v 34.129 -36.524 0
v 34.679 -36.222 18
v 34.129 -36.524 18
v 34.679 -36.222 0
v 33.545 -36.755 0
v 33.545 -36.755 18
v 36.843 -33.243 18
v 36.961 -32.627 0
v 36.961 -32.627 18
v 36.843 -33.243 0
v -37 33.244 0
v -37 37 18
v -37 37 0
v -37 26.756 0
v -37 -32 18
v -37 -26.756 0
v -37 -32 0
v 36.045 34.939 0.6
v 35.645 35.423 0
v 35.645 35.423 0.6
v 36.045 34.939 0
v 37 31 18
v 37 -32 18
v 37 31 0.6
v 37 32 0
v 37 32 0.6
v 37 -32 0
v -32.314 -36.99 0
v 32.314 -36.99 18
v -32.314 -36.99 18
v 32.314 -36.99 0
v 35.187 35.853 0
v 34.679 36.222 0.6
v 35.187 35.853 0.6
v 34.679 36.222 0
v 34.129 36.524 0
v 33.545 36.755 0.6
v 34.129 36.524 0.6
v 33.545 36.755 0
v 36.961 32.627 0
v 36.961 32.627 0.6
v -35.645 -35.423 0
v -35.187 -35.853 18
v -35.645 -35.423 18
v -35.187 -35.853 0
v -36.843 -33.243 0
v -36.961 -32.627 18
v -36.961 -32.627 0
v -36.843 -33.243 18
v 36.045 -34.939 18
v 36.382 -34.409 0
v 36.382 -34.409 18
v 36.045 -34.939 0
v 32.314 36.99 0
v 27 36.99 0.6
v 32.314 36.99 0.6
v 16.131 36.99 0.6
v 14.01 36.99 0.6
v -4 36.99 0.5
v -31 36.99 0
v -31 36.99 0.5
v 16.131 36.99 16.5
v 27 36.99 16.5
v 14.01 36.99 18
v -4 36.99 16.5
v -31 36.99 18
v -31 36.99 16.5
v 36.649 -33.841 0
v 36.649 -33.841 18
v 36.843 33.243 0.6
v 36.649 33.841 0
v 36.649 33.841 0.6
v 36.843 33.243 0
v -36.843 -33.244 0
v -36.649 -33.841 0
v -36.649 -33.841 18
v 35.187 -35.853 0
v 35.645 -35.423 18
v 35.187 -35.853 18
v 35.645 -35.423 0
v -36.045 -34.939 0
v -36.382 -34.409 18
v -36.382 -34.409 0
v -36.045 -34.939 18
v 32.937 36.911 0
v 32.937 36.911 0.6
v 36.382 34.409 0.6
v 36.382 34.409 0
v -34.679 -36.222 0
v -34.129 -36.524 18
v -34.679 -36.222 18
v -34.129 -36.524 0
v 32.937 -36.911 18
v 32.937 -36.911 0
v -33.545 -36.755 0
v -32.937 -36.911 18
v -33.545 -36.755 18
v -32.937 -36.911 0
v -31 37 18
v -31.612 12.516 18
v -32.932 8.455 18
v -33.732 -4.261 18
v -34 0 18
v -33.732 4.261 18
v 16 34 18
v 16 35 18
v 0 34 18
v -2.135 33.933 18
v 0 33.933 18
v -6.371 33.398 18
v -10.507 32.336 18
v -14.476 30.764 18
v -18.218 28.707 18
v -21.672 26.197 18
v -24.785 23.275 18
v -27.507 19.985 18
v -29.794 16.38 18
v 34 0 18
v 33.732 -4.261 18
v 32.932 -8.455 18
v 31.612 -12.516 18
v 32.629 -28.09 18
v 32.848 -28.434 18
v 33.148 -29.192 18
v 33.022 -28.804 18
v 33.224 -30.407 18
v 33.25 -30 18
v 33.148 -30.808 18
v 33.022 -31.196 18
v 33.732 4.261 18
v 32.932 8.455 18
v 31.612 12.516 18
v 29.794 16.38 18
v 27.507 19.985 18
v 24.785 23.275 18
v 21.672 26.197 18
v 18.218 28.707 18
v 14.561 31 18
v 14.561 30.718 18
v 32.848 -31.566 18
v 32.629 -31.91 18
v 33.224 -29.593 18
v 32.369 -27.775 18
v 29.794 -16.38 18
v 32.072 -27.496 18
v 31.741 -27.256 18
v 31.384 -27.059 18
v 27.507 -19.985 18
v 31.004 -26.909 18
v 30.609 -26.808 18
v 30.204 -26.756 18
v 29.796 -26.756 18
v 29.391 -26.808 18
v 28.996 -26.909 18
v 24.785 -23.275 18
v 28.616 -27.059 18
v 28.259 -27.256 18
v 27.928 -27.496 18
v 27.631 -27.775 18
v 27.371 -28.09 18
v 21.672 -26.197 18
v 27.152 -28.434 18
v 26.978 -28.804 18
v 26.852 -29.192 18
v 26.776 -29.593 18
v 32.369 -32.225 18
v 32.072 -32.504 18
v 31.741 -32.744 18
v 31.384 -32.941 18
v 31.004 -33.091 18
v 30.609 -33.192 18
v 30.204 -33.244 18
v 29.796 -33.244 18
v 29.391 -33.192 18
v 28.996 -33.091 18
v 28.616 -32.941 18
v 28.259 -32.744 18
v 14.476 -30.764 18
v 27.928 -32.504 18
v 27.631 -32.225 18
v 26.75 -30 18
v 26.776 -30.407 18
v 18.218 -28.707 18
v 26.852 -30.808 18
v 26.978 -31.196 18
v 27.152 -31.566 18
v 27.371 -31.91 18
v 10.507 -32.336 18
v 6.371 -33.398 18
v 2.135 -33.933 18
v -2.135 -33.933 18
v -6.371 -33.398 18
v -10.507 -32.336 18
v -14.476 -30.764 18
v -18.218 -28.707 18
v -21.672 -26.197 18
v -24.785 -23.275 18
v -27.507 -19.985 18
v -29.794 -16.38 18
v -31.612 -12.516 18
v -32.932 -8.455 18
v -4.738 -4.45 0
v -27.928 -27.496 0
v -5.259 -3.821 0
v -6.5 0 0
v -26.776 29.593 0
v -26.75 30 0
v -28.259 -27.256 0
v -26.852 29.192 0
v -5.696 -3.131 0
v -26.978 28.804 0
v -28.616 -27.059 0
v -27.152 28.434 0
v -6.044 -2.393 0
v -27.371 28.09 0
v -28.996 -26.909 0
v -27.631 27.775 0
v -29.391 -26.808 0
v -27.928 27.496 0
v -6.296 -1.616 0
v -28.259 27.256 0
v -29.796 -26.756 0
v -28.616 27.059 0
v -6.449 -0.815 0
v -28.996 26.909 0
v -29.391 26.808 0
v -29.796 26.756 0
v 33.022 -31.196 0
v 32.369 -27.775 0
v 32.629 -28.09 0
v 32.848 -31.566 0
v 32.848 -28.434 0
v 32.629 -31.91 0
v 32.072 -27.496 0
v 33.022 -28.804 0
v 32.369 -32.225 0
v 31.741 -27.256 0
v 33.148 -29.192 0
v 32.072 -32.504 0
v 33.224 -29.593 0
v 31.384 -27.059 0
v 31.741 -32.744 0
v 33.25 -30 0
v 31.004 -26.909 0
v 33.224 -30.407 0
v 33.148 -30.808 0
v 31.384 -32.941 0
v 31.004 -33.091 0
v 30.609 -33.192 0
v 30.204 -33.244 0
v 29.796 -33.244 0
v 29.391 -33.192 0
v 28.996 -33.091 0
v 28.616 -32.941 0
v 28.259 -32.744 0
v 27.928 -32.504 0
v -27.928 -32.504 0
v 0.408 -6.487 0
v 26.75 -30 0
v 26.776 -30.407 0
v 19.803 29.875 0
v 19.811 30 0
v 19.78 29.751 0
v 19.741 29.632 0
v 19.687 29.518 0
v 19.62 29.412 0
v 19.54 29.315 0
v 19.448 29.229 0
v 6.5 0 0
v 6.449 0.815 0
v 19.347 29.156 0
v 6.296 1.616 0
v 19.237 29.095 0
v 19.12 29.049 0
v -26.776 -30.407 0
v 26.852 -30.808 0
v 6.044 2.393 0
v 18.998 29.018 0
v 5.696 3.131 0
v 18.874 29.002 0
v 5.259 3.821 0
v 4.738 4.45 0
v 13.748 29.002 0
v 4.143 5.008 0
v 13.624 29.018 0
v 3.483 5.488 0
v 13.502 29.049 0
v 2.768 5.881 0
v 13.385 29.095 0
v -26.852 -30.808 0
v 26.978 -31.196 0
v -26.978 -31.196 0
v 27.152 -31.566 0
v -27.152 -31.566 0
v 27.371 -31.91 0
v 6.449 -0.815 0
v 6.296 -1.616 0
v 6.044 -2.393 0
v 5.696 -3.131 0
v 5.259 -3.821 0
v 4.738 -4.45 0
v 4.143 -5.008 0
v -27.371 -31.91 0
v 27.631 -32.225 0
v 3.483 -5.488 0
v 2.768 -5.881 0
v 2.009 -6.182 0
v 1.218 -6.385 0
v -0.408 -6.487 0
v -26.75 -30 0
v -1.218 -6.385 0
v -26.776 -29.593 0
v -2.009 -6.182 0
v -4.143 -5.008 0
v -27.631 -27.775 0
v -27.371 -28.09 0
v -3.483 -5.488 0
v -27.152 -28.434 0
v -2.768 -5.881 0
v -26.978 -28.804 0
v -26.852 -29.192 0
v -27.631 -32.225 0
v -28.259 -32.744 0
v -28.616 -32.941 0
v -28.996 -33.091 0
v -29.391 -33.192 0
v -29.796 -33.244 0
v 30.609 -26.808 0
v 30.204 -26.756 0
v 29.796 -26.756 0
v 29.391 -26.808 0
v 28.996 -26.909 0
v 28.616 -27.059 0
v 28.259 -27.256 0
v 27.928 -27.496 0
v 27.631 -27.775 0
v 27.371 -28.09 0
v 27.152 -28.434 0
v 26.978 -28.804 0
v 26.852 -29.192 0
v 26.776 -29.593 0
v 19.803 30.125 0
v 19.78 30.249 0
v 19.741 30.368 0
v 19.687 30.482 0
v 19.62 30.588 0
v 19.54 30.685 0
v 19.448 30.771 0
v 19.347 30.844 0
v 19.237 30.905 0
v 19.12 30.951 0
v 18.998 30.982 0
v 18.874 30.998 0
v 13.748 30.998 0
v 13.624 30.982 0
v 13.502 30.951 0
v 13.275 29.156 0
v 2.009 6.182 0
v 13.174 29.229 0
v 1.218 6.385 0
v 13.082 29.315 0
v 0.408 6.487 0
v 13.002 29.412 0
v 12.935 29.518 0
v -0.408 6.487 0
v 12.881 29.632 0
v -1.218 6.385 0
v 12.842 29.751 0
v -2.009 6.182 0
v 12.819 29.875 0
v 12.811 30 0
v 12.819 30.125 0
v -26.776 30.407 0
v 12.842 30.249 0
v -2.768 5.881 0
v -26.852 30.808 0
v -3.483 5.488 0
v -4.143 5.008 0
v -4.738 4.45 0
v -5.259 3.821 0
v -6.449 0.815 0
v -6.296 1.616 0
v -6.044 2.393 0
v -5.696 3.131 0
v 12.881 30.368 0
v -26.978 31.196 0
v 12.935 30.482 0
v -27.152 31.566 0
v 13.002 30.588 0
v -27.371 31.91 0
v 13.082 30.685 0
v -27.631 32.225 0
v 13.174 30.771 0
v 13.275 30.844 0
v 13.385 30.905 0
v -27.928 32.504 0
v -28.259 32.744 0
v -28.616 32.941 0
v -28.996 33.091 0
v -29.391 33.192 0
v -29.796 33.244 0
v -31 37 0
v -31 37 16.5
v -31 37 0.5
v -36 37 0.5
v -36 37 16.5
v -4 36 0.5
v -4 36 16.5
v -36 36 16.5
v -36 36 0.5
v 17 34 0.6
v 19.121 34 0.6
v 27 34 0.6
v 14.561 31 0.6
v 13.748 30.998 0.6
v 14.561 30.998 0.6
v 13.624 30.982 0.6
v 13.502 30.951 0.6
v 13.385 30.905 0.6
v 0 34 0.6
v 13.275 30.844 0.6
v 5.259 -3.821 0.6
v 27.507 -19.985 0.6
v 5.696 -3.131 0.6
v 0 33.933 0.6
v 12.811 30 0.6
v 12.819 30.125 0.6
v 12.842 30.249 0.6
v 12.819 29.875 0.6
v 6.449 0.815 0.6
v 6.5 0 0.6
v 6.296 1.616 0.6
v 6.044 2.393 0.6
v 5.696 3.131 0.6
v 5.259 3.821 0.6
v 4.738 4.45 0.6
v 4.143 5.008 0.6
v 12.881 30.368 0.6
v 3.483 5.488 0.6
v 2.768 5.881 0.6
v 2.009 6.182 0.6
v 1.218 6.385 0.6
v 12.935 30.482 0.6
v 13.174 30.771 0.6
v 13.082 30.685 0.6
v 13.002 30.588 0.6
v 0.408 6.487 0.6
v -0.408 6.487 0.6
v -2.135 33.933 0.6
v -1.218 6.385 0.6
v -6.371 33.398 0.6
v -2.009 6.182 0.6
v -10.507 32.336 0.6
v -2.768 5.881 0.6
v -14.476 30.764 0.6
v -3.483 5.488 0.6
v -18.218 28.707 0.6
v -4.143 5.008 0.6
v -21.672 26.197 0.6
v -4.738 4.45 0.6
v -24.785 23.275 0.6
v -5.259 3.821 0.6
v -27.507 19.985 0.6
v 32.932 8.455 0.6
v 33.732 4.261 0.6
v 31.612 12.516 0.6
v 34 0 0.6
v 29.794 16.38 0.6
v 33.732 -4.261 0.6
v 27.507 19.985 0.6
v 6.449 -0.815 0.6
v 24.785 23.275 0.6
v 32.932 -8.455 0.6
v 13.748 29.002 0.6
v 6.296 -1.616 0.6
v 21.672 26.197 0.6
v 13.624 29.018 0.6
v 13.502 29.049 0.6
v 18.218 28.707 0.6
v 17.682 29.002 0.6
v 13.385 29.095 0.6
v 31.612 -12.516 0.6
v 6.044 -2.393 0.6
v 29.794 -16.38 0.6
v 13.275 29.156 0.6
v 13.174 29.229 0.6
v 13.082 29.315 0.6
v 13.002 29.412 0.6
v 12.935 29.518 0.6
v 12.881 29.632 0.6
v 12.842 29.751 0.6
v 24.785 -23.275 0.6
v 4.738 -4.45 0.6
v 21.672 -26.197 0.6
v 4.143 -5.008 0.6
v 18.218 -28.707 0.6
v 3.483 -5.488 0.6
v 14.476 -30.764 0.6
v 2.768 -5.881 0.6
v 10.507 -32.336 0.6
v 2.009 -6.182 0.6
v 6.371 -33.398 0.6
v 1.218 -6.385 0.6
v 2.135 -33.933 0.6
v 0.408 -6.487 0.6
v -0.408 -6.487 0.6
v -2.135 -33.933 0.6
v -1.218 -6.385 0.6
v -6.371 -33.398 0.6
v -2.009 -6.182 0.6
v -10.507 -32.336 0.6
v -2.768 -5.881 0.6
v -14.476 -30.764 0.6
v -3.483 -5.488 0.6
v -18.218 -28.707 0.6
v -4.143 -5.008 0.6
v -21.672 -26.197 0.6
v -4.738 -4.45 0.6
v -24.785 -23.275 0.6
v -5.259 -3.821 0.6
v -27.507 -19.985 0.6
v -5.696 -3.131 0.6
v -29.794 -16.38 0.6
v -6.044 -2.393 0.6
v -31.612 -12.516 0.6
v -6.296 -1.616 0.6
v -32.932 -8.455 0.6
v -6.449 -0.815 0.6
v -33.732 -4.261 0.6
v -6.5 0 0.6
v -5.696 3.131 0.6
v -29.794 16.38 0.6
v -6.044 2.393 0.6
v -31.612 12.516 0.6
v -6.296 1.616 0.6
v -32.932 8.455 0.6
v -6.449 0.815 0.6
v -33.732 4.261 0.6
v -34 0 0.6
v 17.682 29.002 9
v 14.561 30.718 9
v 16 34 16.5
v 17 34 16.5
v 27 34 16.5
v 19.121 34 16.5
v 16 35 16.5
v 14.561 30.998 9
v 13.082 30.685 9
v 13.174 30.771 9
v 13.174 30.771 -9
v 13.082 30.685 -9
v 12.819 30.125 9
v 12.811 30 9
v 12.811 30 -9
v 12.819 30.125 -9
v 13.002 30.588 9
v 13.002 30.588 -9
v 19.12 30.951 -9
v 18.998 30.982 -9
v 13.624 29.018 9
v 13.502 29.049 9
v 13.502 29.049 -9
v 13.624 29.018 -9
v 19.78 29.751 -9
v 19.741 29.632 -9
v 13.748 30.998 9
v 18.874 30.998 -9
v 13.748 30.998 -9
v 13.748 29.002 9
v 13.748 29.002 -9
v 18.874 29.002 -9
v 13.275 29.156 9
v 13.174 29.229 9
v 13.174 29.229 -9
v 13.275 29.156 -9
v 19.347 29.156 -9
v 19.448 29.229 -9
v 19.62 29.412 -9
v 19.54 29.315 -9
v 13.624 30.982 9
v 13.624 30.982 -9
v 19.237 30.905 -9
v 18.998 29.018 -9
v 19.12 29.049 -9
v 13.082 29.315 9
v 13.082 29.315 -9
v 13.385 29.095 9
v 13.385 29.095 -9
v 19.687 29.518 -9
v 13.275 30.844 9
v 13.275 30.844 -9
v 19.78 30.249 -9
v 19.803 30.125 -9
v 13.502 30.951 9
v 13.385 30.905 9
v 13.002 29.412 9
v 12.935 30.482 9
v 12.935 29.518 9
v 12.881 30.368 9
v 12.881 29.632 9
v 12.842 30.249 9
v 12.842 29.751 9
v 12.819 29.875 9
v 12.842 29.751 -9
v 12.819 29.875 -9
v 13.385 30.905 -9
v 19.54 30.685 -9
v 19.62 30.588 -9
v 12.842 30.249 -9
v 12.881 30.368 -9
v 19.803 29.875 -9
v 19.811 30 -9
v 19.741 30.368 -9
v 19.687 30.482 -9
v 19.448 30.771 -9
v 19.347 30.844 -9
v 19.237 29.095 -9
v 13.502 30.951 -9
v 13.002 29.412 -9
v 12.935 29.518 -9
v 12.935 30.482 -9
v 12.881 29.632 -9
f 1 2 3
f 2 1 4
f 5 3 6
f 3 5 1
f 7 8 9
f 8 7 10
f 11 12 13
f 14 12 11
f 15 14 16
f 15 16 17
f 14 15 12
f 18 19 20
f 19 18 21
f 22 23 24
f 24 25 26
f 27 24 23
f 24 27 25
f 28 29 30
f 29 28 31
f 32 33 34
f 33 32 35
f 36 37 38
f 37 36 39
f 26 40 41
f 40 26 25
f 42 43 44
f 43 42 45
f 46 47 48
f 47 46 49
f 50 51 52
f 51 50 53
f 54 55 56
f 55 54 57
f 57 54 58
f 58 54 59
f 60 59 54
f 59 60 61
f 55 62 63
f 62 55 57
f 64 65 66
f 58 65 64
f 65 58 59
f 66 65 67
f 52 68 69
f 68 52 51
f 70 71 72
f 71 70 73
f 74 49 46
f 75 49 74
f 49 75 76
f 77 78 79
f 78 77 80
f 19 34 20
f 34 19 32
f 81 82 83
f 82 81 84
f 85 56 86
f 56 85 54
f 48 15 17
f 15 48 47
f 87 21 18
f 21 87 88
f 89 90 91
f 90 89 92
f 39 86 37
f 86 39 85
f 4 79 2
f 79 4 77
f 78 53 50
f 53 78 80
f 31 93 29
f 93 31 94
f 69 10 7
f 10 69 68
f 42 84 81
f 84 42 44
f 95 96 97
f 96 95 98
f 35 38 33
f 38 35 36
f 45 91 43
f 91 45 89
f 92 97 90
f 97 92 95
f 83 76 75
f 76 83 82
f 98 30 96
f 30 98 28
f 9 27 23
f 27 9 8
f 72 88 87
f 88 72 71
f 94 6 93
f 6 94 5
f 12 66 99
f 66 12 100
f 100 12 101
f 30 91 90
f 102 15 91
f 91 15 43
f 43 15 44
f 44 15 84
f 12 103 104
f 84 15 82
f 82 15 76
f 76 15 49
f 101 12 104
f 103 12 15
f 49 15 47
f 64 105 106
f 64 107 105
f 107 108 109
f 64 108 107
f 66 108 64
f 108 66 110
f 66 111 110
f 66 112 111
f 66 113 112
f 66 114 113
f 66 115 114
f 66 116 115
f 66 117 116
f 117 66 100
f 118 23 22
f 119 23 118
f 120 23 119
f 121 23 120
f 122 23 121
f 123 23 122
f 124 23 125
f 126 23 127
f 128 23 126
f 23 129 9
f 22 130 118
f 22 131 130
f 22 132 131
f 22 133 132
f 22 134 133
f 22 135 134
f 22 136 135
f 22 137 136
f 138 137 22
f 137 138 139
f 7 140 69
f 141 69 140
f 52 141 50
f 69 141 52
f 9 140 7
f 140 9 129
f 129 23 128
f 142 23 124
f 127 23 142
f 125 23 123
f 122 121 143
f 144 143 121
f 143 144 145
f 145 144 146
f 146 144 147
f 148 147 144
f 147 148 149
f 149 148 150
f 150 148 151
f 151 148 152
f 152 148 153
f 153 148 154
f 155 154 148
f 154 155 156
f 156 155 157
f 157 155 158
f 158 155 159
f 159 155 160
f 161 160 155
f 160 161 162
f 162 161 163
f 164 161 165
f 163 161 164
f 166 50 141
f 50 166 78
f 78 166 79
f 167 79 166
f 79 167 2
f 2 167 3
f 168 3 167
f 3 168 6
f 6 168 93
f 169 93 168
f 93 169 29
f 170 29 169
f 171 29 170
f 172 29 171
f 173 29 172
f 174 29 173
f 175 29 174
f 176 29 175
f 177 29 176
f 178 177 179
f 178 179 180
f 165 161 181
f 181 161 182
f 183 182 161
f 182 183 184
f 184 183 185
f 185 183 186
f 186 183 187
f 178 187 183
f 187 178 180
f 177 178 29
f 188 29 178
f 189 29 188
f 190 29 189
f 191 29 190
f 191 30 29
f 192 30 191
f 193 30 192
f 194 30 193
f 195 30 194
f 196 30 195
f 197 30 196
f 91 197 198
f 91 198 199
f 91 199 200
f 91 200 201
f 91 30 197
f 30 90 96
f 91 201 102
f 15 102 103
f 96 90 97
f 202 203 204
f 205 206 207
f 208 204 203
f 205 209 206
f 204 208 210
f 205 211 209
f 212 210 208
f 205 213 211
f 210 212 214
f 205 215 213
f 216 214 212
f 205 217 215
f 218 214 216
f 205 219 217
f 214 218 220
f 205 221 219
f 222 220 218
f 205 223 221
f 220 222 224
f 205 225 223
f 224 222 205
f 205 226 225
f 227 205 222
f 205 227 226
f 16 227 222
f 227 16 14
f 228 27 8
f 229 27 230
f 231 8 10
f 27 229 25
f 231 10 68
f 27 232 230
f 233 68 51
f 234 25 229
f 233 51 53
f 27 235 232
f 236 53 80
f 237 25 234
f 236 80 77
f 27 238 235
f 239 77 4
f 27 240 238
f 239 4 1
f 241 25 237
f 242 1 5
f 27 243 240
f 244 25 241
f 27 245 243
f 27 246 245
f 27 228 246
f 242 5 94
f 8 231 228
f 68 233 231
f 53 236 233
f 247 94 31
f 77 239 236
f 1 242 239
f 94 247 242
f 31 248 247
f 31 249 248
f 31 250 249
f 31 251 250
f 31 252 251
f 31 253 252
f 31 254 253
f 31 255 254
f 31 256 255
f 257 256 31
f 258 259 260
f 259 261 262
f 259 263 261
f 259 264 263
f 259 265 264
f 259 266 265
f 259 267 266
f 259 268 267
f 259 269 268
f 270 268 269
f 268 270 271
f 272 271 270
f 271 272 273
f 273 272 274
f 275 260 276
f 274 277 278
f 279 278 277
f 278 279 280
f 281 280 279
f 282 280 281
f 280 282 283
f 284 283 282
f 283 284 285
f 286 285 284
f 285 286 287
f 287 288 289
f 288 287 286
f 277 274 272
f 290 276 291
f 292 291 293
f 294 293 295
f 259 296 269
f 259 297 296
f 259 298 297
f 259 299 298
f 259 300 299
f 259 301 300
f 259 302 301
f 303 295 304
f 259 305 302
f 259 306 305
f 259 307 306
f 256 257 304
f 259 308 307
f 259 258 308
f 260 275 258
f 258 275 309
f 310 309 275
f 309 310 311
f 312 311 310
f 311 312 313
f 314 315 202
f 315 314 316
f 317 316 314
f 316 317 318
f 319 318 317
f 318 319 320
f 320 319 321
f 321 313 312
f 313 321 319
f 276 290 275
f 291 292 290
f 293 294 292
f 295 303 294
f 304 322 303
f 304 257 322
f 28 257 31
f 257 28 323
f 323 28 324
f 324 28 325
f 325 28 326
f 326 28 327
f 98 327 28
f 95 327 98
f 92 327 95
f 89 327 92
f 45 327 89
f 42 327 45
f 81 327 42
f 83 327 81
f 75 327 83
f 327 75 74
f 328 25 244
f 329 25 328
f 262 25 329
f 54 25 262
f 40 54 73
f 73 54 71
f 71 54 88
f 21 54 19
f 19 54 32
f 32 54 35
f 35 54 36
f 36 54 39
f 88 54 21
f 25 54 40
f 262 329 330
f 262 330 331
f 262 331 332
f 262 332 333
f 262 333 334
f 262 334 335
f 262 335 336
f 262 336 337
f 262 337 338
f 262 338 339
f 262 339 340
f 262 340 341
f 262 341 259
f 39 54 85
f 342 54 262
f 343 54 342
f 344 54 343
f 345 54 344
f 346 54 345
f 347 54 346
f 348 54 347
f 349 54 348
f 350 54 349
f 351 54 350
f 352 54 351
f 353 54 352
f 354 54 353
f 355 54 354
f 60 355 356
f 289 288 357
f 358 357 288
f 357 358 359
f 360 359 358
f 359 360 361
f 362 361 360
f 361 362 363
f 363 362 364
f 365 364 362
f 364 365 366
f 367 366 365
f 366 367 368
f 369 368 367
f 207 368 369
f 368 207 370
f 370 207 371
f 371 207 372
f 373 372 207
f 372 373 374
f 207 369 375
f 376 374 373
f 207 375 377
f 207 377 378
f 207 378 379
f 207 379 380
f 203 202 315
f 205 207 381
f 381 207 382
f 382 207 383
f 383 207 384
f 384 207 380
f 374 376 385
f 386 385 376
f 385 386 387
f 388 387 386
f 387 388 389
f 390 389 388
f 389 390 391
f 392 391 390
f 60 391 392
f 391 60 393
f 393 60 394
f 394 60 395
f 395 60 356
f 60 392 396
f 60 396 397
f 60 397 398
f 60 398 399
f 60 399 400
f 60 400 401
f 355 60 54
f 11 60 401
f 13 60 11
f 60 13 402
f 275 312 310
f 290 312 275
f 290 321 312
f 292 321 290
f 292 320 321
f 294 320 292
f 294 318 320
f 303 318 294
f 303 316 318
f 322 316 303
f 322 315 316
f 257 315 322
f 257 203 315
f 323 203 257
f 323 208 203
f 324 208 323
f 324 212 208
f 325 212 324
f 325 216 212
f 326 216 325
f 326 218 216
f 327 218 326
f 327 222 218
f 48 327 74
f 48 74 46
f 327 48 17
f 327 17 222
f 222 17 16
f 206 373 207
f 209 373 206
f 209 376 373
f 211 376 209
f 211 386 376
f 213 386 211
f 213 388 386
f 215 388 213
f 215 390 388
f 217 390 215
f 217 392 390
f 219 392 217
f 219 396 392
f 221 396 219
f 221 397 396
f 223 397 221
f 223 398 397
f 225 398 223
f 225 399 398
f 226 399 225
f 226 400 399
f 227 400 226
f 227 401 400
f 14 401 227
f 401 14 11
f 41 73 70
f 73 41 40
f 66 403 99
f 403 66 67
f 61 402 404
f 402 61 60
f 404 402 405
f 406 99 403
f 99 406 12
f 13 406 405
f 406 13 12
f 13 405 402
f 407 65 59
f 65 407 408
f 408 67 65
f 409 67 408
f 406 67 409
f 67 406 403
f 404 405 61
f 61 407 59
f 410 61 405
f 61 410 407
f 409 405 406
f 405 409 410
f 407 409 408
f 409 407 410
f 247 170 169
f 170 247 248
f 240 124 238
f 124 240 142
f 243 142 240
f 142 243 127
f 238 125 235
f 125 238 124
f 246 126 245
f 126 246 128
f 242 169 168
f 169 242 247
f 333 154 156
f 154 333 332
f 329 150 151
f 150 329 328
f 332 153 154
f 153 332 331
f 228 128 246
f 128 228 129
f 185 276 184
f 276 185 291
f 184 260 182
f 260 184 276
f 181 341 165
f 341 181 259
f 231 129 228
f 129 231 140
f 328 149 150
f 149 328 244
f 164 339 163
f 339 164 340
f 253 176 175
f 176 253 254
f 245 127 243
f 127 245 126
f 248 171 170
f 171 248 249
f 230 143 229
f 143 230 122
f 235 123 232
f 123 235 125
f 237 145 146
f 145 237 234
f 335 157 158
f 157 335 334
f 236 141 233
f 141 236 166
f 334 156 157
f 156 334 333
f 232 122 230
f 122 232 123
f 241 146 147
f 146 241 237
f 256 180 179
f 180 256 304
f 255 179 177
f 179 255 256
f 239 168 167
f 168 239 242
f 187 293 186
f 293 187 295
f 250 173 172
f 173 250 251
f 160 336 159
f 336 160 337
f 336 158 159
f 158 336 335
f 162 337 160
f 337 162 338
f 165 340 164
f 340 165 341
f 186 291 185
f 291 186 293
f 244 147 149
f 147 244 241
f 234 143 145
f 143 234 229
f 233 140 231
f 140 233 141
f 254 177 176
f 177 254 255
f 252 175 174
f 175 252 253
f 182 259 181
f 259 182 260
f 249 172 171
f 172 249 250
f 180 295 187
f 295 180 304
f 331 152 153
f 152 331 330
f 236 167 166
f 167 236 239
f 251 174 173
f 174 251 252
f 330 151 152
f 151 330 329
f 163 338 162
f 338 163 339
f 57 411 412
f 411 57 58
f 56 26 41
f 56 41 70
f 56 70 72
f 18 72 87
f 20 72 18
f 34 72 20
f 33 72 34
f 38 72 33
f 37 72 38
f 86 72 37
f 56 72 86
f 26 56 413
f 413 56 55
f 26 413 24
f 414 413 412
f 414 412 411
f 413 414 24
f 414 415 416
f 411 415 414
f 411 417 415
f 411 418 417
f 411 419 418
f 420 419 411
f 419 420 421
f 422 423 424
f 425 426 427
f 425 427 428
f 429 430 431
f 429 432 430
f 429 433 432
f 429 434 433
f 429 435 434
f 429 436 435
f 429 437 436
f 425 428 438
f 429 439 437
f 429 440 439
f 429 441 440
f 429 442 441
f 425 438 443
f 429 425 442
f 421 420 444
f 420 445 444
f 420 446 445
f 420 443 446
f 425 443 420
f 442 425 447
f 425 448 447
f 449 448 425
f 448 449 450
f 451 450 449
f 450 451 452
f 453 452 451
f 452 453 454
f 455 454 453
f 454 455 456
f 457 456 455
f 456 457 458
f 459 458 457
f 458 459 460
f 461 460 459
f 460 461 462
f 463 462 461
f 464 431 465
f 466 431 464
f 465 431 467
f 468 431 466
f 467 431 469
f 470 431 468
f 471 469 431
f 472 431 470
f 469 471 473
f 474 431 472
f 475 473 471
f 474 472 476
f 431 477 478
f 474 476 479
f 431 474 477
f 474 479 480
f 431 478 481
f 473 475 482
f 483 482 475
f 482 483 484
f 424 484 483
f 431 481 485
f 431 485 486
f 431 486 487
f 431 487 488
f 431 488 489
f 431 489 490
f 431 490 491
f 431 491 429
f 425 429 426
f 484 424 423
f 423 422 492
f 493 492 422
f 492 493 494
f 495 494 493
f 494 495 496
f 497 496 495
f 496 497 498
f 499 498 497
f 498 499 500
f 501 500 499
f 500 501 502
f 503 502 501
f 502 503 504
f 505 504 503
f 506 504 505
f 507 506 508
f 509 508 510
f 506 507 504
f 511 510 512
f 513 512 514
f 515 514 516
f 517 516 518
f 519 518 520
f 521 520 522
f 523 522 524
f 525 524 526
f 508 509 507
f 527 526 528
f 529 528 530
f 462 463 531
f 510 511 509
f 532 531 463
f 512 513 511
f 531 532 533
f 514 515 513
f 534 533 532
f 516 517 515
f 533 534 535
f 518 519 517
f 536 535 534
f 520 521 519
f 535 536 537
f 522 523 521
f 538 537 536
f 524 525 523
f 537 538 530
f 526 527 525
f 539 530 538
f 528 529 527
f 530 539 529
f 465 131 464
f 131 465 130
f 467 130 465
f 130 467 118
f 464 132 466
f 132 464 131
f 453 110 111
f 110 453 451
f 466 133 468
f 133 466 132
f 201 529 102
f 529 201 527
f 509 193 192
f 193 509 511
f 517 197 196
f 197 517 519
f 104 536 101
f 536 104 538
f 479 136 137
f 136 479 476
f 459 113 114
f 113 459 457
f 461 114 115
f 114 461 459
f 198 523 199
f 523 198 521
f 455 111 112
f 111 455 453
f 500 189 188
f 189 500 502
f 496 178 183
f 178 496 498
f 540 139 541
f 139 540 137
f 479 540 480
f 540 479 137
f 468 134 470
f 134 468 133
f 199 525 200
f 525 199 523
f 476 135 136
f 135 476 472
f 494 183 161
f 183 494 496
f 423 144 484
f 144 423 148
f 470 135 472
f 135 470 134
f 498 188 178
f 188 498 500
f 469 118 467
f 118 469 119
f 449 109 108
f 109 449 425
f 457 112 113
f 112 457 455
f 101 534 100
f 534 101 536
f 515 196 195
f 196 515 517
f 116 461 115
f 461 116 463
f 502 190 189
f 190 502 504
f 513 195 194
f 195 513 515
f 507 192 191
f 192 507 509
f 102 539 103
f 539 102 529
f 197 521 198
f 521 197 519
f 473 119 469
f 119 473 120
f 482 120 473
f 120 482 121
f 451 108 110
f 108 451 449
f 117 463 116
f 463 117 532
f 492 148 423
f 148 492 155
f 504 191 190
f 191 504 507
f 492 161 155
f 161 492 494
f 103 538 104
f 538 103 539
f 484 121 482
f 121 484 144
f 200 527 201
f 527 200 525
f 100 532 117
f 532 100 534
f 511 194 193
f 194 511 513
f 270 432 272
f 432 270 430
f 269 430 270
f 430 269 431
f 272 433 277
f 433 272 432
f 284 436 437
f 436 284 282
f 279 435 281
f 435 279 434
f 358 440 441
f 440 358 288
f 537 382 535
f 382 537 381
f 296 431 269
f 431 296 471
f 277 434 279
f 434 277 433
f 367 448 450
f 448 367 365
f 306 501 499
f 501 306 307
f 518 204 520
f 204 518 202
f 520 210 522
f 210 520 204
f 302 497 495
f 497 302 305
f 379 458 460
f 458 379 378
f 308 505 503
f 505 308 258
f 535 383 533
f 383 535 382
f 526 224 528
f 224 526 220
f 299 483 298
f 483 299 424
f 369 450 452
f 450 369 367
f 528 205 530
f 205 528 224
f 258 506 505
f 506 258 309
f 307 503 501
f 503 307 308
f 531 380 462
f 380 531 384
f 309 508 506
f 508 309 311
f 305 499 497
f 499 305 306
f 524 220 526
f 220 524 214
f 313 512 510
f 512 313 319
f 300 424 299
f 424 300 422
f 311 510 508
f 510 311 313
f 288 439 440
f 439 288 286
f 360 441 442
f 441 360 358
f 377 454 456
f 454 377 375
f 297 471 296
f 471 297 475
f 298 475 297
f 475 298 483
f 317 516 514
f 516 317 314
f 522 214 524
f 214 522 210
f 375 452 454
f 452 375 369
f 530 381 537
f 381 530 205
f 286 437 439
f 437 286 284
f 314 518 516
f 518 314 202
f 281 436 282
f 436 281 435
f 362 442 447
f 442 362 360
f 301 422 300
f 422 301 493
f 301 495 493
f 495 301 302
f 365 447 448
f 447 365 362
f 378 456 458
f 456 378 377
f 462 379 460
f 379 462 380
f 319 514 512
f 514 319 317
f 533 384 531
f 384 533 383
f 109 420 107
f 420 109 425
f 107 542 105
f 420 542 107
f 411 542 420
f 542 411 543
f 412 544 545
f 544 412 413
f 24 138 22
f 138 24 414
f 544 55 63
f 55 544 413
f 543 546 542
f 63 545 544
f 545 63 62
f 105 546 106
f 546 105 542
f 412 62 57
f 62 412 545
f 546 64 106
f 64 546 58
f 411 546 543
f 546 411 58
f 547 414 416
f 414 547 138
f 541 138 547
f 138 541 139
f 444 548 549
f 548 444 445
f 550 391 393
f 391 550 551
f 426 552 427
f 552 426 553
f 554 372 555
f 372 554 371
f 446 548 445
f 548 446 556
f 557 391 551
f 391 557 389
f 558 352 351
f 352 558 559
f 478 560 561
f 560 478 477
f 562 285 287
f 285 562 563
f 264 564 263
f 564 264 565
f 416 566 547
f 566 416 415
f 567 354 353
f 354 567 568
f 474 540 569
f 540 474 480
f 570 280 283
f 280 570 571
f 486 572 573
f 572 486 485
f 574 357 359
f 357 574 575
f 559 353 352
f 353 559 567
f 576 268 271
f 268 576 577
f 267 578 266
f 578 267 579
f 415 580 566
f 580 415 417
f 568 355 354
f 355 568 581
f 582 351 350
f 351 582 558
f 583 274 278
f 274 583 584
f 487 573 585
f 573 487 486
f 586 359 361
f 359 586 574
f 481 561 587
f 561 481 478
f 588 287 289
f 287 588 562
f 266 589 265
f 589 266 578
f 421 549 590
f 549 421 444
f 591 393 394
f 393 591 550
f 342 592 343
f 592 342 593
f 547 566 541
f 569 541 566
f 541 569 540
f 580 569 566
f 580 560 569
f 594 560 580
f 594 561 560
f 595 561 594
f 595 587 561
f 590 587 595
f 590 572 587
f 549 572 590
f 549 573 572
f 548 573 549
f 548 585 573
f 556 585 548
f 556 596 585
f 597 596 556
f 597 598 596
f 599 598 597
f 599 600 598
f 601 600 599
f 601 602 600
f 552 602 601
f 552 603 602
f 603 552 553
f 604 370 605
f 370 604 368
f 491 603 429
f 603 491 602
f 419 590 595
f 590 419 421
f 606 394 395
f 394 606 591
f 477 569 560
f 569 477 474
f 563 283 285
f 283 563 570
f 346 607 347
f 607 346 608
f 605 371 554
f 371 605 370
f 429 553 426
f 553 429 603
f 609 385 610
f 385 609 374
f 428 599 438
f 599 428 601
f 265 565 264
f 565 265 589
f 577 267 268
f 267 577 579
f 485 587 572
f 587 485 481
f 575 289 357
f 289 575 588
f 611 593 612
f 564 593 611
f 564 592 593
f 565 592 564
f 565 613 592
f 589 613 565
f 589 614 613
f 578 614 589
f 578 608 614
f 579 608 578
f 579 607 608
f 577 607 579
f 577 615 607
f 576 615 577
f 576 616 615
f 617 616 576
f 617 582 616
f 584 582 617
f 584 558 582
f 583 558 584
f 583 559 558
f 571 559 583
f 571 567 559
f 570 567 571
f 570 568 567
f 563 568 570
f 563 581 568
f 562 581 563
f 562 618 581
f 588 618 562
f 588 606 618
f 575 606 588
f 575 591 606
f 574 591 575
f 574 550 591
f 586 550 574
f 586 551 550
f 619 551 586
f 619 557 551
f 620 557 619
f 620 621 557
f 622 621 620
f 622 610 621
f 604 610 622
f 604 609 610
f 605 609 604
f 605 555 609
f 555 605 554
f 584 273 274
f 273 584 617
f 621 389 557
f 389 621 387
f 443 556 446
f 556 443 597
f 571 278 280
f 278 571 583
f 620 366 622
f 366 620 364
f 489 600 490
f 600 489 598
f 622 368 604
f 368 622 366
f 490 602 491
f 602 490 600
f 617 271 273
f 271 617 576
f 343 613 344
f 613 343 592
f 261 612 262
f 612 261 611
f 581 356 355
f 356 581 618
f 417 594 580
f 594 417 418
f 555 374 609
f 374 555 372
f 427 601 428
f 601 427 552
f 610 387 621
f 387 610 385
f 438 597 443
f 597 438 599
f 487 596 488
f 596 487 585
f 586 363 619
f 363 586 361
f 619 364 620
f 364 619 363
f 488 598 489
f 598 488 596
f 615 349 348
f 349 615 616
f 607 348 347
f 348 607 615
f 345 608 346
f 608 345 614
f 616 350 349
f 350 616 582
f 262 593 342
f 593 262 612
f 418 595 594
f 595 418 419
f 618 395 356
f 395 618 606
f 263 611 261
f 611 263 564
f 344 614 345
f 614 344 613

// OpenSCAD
$fn = 50;


union() {
	difference() {
		union() {
			hull() {
				translate(v = [-32.0000000000, 32.0000000000, 0]) {
					cylinder(h = 18, r = 5);
				}
				translate(v = [32.0000000000, 32.0000000000, 0]) {
					cylinder(h = 18, r = 5);
				}
				translate(v = [-32.0000000000, -32.0000000000, 0]) {
					cylinder(h = 18, r = 5);
				}
				translate(v = [32.0000000000, -32.0000000000, 0]) {
					cylinder(h = 18, r = 5);
				}
			}
			translate(v = [-37.0000000000, 31.0000000000, 0]) {
				cube(size = [6, 6, 18]);
			}
		}
		union() {
			translate(v = [-37.5000000000, -30.0000000000, -250.0000000000]) {
				rotate(a = [0, 0, 0]) {
					difference() {
						union() {
							hull() {
								translate(v = [7.5000000000, 0, 0]) {
									cylinder(h = 250, r = 3.2500000000, r1 = 3.2500000000, r2 = 3.2500000000);
								}
								translate(v = [-7.5000000000, 0, 0]) {
									cylinder(h = 250, r = 3.2500000000, r1 = 3.2500000000, r2 = 3.2500000000);
								}
							}
						}
						union();
					}
				}
			}
			translate(v = [-37.5000000000, 30.0000000000, -250.0000000000]) {
				rotate(a = [0, 0, 0]) {
					difference() {
						union() {
							hull() {
								translate(v = [7.5000000000, 0, 0]) {
									cylinder(h = 250, r = 3.2500000000, r1 = 3.2500000000, r2 = 3.2500000000);
								}
								translate(v = [-7.5000000000, 0, 0]) {
									cylinder(h = 250, r = 3.2500000000, r1 = 3.2500000000, r2 = 3.2500000000);
								}
							}
						}
						union();
					}
				}
			}
			translate(v = [-36.0000000000, 36.0000000000, 0.5000000000]) {
				cube(size = [32, 1, 16]);
			}
			translate(v = [30.0000000000, -30.0000000000, 0]) {
				cylinder(h = 100, r = 3.2500000000);
			}
			translate(v = [0, 0, 0.6000000000]) {
				cylinder(h = 20.4000000000, r = 34.0000000000);
			}
			translate(v = [0, 0, -9.0000000000]) {
				cylinder(h = 18, r = 6.5000000000);
			}
			translate(v = [0.0000000000, 31.0000000000, 0.6000000000]) {
				cube(size = [37.0000000000, 3, 20.4000000000]);
			}
			translate(v = [27.0000000000, 31.0000000000, 0.6000000000]) {
				cube(size = [10, 6, 20.4000000000]);
			}
			translate(v = [16.0000000000, 31.0000000000, 16.5000000000]) {
				cube(size = [21, 6, 1.5000000000]);
			}
			translate(v = [13.2500000000, 37.7500000000, 0.6000000000]) {
				rotate(a = [0, 0, -45]) {
					cube(size = [7.5000000000, 1.5000000000, 20.4000000000]);
				}
			}
			translate(v = [7.0610000000, 29.0000000000, 0.6000000000]) {
				cube(size = [7.5000000000, 2, 17.4000000000]);
			}
		}
	}
	union() {
		translate(v = [16.3110000000, 30.0000000000, -9.0000000000]) {
			rotate(a = [0, 0, 0]) {
				difference() {
					union() {
						#hull() {
							#translate(v = [2.5000000000, 0, 0]) {
								cylinder(h = 18, r = 1.0000000000, r1 = 1.0000000000, r2 = 1.0000000000);
							}
							#translate(v = [-2.5000000000, 0, 0]) {
								cylinder(h = 18, r = 1.0000000000, r1 = 1.0000000000, r2 = 1.0000000000);
							}
						}
					}
					union();
				}
			}
		}
	}
}
